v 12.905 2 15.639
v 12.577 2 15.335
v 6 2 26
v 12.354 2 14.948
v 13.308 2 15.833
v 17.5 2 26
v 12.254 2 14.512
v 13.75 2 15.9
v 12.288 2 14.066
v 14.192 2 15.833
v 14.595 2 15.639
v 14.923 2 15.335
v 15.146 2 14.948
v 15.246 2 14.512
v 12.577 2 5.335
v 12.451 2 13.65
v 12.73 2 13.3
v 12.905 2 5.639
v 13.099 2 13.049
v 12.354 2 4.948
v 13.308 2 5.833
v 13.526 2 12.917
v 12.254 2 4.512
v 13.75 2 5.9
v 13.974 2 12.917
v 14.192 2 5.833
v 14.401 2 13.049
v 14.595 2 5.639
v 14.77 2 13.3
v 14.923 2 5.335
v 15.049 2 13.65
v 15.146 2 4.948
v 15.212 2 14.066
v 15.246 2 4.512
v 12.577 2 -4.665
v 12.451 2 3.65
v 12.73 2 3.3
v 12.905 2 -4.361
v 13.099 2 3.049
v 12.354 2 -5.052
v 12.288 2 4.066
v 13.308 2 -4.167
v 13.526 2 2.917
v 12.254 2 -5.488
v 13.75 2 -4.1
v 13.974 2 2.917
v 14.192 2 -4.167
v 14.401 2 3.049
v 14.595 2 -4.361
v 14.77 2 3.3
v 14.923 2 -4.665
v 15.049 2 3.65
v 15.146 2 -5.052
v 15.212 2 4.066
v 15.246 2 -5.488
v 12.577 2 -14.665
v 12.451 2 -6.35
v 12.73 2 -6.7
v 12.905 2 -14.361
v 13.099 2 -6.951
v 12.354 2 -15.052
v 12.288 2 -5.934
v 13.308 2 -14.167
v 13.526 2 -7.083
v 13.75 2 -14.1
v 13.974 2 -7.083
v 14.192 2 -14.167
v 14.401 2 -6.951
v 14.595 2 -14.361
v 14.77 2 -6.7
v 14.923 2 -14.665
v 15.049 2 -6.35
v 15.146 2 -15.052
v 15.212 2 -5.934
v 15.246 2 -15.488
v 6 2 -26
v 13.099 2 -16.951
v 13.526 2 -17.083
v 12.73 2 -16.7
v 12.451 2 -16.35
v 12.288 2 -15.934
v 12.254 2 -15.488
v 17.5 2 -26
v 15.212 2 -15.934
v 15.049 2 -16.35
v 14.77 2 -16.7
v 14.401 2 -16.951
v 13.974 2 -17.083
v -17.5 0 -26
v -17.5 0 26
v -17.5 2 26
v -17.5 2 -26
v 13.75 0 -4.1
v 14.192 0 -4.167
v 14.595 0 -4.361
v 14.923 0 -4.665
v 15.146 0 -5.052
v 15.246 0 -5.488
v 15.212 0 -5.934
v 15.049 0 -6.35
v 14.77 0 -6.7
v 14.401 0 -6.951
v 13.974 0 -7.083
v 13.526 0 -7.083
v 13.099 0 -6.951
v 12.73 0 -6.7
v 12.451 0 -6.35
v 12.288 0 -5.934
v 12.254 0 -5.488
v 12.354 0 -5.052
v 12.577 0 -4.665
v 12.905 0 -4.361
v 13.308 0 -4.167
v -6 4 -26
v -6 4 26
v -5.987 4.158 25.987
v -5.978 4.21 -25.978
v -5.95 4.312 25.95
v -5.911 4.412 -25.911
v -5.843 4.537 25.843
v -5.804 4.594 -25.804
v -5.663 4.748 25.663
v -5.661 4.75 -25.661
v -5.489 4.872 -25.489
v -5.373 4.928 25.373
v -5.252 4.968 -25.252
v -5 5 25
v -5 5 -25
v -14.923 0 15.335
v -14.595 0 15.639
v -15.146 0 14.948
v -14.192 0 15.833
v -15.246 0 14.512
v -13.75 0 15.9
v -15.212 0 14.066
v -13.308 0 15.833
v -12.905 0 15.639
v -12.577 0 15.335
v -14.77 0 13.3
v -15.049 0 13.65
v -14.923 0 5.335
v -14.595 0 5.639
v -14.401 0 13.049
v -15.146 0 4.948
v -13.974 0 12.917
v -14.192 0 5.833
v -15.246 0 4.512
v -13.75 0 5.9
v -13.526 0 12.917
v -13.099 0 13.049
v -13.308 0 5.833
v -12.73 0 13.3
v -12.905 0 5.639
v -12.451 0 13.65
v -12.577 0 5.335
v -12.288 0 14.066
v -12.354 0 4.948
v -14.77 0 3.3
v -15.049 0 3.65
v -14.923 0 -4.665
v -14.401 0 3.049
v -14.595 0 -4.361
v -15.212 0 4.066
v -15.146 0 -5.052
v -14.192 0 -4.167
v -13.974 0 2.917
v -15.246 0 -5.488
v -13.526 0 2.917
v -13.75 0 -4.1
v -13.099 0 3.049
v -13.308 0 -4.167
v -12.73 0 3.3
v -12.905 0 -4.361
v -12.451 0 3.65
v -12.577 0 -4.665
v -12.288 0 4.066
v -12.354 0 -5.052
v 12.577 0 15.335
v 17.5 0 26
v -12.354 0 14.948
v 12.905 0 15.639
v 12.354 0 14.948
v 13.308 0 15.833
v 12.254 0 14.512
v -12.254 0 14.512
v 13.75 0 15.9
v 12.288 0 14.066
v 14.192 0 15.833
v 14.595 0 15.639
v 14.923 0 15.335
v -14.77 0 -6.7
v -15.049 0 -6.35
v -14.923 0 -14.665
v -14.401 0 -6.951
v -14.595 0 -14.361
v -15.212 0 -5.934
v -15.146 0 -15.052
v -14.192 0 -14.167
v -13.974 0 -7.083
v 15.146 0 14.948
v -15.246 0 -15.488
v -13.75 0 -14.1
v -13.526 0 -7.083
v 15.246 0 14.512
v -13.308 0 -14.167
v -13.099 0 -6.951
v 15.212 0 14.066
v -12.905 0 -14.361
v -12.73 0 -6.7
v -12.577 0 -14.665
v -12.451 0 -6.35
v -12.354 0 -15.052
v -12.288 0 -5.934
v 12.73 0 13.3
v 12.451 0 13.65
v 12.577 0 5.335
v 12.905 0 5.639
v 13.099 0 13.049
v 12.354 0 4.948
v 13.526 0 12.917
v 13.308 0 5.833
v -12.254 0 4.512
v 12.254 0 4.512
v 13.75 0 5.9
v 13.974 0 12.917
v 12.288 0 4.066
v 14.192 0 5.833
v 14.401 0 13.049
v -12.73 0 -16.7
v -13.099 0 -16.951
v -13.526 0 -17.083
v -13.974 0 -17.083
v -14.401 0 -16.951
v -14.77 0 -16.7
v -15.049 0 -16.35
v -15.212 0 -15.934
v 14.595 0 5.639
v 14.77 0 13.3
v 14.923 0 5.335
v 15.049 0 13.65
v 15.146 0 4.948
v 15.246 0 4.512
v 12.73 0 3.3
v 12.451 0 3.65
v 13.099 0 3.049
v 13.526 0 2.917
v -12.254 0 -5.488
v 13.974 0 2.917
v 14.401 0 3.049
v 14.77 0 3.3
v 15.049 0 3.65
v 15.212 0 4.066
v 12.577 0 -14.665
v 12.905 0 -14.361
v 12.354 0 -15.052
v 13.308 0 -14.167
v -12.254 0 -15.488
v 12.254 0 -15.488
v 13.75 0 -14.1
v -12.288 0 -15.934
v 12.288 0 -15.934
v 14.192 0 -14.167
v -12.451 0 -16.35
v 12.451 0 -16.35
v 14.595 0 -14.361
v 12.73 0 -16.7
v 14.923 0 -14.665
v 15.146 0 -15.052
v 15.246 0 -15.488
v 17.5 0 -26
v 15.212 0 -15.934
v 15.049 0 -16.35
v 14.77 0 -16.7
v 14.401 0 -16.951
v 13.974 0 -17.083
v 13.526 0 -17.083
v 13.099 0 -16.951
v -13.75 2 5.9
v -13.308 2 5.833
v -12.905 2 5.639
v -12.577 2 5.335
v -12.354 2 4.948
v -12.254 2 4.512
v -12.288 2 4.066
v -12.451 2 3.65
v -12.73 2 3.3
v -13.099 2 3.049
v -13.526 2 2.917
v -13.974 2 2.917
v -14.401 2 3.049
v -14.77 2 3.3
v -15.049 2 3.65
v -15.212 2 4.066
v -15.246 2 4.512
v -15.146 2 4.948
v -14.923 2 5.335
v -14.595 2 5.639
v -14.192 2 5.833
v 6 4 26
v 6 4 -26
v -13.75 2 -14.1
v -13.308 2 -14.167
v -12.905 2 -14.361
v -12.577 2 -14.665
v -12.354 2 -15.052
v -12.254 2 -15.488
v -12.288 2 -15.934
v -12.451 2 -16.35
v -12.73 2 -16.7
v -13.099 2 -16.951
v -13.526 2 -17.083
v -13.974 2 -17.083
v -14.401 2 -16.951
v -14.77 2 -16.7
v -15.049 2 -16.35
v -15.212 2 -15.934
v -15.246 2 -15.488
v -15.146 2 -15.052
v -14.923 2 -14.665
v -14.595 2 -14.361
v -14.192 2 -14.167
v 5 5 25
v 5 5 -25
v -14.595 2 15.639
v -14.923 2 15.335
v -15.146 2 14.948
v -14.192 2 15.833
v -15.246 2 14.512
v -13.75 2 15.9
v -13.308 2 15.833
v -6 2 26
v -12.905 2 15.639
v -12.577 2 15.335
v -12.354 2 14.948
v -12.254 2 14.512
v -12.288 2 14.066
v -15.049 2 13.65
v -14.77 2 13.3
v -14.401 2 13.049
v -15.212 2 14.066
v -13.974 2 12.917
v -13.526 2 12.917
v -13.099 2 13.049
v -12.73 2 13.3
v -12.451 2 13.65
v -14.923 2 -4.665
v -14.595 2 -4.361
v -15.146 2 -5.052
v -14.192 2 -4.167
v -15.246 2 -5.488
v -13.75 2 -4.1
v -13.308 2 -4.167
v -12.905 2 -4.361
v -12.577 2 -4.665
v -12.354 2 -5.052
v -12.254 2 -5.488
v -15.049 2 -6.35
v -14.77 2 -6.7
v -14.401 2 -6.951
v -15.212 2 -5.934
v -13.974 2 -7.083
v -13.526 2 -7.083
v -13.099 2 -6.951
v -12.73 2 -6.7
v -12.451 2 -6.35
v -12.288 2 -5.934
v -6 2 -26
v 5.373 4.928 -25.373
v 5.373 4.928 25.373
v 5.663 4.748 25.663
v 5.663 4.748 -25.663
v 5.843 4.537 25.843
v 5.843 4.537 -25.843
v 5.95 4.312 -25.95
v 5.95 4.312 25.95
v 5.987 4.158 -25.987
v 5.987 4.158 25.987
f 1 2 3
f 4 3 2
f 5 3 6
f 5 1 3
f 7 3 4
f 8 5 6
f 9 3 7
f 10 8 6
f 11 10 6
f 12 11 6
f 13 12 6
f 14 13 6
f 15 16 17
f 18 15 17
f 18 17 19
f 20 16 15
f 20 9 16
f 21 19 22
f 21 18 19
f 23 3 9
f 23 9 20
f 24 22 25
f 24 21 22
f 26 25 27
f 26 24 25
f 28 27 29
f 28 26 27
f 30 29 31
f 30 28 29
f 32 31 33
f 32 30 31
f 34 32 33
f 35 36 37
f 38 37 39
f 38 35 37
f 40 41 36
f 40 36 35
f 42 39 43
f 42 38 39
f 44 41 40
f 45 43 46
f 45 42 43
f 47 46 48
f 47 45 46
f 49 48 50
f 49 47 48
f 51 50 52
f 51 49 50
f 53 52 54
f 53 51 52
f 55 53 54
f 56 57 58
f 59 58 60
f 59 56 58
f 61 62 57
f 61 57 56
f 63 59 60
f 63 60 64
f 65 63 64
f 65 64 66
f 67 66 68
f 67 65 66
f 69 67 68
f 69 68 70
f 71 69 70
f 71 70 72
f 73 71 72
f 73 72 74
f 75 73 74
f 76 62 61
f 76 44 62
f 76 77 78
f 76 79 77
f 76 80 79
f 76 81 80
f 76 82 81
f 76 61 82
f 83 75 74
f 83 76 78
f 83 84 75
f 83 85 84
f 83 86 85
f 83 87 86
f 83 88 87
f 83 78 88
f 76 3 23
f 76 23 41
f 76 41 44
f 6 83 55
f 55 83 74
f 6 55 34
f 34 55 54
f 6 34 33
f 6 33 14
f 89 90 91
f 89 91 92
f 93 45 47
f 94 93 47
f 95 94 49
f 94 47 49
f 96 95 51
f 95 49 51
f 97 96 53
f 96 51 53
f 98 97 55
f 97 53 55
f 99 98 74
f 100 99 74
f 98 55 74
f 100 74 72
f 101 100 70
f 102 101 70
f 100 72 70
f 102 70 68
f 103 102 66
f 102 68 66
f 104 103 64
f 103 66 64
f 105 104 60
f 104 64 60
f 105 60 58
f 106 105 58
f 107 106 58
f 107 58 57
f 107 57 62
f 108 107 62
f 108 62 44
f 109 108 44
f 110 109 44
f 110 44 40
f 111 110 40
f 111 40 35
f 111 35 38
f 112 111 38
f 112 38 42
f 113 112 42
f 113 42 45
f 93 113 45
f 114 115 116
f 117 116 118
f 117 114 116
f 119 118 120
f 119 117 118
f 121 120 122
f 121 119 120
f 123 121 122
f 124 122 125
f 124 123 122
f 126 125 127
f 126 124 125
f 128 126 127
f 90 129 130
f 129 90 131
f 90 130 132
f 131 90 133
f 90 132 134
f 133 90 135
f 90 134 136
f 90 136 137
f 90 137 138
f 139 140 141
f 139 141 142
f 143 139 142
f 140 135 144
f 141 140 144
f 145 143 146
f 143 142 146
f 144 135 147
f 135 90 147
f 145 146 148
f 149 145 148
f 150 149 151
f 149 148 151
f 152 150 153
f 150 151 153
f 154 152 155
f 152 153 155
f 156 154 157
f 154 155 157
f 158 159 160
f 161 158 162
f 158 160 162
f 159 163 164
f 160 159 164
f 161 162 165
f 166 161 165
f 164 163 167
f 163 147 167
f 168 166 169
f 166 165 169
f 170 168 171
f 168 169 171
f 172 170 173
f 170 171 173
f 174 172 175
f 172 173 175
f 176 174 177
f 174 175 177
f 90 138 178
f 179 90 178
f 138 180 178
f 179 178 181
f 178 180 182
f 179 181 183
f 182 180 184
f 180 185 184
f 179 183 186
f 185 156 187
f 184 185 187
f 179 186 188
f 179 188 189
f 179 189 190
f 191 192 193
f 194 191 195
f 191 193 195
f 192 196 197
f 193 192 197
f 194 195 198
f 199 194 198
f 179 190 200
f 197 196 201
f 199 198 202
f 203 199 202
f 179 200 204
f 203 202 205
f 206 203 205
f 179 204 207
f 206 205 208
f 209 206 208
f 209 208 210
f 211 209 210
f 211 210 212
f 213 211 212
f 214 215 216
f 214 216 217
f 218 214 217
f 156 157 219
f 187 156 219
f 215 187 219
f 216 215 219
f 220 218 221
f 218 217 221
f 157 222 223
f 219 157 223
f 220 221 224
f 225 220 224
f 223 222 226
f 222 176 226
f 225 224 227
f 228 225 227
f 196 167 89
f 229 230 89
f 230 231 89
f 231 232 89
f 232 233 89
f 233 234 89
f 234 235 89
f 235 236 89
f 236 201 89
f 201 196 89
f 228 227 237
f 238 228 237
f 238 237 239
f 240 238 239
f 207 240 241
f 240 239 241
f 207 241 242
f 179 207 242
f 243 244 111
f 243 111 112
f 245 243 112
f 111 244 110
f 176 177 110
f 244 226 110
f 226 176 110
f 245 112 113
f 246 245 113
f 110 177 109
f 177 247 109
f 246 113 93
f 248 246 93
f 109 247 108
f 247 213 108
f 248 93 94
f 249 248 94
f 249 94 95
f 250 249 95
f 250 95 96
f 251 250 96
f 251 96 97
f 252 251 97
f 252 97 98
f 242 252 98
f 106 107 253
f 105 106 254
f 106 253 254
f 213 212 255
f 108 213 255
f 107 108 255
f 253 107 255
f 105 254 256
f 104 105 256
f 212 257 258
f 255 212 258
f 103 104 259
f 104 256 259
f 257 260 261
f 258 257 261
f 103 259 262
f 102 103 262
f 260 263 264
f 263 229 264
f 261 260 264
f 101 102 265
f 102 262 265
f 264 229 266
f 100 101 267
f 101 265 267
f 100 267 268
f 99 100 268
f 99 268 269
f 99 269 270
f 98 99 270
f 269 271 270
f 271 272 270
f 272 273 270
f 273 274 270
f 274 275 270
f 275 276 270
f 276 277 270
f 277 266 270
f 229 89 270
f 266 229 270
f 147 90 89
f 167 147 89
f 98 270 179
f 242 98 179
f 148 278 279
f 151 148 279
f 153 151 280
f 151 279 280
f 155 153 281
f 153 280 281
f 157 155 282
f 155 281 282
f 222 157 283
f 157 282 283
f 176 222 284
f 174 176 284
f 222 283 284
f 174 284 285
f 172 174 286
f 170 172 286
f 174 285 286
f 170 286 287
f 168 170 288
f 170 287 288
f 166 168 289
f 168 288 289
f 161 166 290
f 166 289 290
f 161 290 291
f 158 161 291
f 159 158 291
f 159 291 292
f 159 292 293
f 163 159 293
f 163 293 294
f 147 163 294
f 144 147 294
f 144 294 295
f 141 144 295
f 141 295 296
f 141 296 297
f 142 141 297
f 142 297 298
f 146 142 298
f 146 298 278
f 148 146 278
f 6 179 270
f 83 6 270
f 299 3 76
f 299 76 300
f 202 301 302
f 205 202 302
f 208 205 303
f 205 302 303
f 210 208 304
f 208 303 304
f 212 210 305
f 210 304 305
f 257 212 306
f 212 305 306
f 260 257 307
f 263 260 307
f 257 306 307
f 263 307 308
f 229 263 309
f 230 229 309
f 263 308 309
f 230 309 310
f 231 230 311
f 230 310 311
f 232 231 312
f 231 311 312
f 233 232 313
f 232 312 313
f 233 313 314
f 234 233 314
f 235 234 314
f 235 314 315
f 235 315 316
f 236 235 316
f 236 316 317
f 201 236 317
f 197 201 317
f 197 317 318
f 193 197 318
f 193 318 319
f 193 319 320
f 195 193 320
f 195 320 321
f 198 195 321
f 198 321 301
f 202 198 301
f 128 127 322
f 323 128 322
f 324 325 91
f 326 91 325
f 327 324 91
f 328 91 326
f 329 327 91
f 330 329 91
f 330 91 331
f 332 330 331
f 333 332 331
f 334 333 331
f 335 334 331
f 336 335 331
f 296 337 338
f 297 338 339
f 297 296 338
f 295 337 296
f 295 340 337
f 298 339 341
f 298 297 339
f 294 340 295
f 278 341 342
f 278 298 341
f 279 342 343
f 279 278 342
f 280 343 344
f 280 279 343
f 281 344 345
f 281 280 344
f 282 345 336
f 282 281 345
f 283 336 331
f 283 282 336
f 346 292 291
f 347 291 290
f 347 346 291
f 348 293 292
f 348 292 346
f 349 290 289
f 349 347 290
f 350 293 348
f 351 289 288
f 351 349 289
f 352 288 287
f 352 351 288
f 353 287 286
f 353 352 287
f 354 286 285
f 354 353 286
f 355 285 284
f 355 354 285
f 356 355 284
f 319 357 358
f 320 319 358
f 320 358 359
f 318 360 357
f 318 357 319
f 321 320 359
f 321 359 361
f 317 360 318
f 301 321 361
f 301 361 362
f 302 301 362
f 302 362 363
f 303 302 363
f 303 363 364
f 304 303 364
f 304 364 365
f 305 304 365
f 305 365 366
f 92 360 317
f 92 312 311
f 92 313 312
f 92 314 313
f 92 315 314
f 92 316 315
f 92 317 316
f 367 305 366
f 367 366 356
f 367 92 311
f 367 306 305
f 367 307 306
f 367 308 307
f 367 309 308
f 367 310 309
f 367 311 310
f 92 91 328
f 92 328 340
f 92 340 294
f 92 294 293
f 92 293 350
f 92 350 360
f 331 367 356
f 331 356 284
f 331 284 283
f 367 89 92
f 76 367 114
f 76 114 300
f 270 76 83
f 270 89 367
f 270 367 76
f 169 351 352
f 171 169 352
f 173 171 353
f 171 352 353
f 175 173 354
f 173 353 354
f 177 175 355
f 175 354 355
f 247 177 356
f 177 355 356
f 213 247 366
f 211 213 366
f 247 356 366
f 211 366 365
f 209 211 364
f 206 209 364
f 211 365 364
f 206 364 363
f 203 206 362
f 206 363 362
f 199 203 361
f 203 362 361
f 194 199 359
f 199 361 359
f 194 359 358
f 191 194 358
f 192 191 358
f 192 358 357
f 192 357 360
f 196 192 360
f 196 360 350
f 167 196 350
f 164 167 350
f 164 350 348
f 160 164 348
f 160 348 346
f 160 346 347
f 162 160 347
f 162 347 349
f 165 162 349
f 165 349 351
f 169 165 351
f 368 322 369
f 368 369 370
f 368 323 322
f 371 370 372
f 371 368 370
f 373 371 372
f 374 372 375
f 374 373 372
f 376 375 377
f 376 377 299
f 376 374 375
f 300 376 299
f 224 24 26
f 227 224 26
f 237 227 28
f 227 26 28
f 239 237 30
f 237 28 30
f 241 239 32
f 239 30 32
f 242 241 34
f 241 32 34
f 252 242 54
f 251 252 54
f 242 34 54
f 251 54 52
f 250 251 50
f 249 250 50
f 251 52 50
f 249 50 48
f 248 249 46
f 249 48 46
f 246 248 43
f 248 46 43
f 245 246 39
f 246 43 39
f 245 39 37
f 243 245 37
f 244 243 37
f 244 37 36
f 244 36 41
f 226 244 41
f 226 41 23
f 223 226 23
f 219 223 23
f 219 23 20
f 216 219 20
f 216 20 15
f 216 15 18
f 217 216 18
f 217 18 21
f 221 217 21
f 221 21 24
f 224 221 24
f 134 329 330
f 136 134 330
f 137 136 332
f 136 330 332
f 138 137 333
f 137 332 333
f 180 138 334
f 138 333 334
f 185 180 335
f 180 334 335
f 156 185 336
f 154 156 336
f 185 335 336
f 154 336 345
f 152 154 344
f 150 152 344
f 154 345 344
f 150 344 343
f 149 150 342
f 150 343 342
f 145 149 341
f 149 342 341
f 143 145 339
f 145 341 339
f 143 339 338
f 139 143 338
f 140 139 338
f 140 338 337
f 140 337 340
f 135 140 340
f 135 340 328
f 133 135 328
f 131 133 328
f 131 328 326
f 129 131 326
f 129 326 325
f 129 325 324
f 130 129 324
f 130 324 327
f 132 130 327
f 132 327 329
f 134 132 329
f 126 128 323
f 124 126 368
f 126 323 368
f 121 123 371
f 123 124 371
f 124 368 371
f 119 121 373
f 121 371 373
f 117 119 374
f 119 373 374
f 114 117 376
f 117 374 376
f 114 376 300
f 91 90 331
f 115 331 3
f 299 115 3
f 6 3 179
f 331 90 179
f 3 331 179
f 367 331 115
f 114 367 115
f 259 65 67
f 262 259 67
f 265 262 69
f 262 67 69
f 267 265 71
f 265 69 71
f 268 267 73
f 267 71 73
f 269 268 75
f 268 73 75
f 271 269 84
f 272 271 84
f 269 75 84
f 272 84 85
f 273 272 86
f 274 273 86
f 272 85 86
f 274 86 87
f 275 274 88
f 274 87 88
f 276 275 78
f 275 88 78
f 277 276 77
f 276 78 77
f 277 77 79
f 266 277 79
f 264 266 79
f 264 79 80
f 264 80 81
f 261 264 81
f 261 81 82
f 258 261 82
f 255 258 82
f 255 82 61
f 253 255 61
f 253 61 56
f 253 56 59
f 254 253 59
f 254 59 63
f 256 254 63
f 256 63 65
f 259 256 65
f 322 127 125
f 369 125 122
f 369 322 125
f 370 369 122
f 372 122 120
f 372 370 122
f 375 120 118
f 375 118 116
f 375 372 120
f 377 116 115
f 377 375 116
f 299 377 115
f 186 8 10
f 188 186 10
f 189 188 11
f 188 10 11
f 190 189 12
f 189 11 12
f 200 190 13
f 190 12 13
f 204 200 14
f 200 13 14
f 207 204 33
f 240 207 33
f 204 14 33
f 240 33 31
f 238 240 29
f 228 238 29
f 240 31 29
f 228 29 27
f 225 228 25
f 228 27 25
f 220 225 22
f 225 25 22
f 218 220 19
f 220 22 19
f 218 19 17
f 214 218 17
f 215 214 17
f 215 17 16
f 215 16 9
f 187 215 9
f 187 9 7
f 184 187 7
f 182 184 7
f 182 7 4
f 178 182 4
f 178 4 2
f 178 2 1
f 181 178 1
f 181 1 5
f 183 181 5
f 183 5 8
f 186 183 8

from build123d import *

# Parameters (mm, degrees)
SKETCH_1_W                  = 35
SKETCH_1_H                  = 52
EXTRUDE_1_DEPTH             = 2
EXTRUDE_2_REACH             = 33.405
SKETCH_2_W                  = 12
SKETCH_2_H                  = 3
EXTRUDE_2_DIRECTION_2_REACH = 33.405
SKETCH_3_R                  = 1.5
CUT_EXTRUDE_1_DEPTH         = 10
FILLET_1_R                  = 1


with BuildPart() as part:
    # Эскиз1 → Бобышка-Вытянуть1 (new body)
    with BuildSketch(Plane(origin=(0, 0, 0), x_dir=(1, 0, 0), z_dir=(0, 1, 0))):
        Rectangle(SKETCH_1_W, SKETCH_1_H)
    extrude(amount=EXTRUDE_1_DEPTH)

    # Бобышка-Вытянуть2: up to this face of the body (flat: up to its plane)
    extrude_2_end = Plane(part.part.faces().sort_by_distance((0, 1, 26))[0])
    # Эскиз2 → Бобышка-Вытянуть2 (add, up to the picked face)
    with BuildSketch(Plane.XY, mode=Mode.PRIVATE) as extrude_2_sk1:
        with Locations((0, 3.5)):
            Rectangle(SKETCH_2_W, SKETCH_2_H)
    extrude_2_tool1 = split(extrude(extrude_2_sk1.sketch, amount=EXTRUDE_2_REACH, mode=Mode.PRIVATE), bisect_by=extrude_2_end, keep=Keep.BOTH, mode=Mode.PRIVATE)
    add(extrude_2_tool1.solids().sort_by(Axis((0, 3.5, 0), (0, 0, 1)))[0])

    # Бобышка-Вытянуть2 direction 2: up to this face of the body (flat: up to its plane)
    extrude_2_direction_2_end = Plane(part.part.faces().sort_by_distance((0, 1, -26))[0])
    # Эскиз2 → Бобышка-Вытянуть2 direction 2 (add, up to the picked face)
    with BuildSketch(Plane.XY, mode=Mode.PRIVATE) as extrude_2_direction_2_sk1:
        with Locations((0, 3.5)):
            Rectangle(SKETCH_2_W, SKETCH_2_H)
    extrude_2_direction_2_tool1 = split(extrude(extrude_2_direction_2_sk1.sketch, amount=-EXTRUDE_2_DIRECTION_2_REACH, mode=Mode.PRIVATE), bisect_by=extrude_2_direction_2_end, keep=Keep.BOTH, mode=Mode.PRIVATE)
    add(extrude_2_direction_2_tool1.solids().sort_by(Axis((0, 3.5, 0), (0, 0, -1)))[0])

    # Эскиз3 → Вырез-Вытянуть1 (cut)
    with BuildSketch(Plane(origin=(0, 2, 0), x_dir=(1, 0, 0), z_dir=(0, 1, 0))):
        with Locations(Location((13.75, 15.6, 0), (0, 0, 270))):
            Circle(SKETCH_3_R)
        with Locations(Location((-13.75, 15.6, 0), (0, 0, 270))):
            Circle(SKETCH_3_R)
        with Locations(Location((-13.75, 5.6, 0), (0, 0, 270))):
            Circle(SKETCH_3_R)
        with Locations(Location((13.75, 5.6, 0), (0, 0, 270))):
            Circle(SKETCH_3_R)
        with Locations(Location((-13.75, -4.4, 0), (0, 0, 270))):
            Circle(SKETCH_3_R)
        with Locations(Location((13.75, -4.4, 0), (0, 0, 270))):
            Circle(SKETCH_3_R)
        with Locations(Location((-13.75, -14.4, 0), (0, 0, 270))):
            Circle(SKETCH_3_R)
        with Locations(Location((13.75, -14.4, 0), (0, 0, 270))):
            Circle(SKETCH_3_R)
    extrude(amount=-CUT_EXTRUDE_1_DEPTH, mode=Mode.SUBTRACT)

    # Скругление1
    fillet_1_edges = [part.edges().sort_by_distance(p)[0] for p in [
        (0, 5, 26),
        (6, 5, 0),
        (-6, 5, 0),
        (0, 5, -26),
    ]]
    fillet(fillet_1_edges, radius=FILLET_1_R)


solid = part.part
